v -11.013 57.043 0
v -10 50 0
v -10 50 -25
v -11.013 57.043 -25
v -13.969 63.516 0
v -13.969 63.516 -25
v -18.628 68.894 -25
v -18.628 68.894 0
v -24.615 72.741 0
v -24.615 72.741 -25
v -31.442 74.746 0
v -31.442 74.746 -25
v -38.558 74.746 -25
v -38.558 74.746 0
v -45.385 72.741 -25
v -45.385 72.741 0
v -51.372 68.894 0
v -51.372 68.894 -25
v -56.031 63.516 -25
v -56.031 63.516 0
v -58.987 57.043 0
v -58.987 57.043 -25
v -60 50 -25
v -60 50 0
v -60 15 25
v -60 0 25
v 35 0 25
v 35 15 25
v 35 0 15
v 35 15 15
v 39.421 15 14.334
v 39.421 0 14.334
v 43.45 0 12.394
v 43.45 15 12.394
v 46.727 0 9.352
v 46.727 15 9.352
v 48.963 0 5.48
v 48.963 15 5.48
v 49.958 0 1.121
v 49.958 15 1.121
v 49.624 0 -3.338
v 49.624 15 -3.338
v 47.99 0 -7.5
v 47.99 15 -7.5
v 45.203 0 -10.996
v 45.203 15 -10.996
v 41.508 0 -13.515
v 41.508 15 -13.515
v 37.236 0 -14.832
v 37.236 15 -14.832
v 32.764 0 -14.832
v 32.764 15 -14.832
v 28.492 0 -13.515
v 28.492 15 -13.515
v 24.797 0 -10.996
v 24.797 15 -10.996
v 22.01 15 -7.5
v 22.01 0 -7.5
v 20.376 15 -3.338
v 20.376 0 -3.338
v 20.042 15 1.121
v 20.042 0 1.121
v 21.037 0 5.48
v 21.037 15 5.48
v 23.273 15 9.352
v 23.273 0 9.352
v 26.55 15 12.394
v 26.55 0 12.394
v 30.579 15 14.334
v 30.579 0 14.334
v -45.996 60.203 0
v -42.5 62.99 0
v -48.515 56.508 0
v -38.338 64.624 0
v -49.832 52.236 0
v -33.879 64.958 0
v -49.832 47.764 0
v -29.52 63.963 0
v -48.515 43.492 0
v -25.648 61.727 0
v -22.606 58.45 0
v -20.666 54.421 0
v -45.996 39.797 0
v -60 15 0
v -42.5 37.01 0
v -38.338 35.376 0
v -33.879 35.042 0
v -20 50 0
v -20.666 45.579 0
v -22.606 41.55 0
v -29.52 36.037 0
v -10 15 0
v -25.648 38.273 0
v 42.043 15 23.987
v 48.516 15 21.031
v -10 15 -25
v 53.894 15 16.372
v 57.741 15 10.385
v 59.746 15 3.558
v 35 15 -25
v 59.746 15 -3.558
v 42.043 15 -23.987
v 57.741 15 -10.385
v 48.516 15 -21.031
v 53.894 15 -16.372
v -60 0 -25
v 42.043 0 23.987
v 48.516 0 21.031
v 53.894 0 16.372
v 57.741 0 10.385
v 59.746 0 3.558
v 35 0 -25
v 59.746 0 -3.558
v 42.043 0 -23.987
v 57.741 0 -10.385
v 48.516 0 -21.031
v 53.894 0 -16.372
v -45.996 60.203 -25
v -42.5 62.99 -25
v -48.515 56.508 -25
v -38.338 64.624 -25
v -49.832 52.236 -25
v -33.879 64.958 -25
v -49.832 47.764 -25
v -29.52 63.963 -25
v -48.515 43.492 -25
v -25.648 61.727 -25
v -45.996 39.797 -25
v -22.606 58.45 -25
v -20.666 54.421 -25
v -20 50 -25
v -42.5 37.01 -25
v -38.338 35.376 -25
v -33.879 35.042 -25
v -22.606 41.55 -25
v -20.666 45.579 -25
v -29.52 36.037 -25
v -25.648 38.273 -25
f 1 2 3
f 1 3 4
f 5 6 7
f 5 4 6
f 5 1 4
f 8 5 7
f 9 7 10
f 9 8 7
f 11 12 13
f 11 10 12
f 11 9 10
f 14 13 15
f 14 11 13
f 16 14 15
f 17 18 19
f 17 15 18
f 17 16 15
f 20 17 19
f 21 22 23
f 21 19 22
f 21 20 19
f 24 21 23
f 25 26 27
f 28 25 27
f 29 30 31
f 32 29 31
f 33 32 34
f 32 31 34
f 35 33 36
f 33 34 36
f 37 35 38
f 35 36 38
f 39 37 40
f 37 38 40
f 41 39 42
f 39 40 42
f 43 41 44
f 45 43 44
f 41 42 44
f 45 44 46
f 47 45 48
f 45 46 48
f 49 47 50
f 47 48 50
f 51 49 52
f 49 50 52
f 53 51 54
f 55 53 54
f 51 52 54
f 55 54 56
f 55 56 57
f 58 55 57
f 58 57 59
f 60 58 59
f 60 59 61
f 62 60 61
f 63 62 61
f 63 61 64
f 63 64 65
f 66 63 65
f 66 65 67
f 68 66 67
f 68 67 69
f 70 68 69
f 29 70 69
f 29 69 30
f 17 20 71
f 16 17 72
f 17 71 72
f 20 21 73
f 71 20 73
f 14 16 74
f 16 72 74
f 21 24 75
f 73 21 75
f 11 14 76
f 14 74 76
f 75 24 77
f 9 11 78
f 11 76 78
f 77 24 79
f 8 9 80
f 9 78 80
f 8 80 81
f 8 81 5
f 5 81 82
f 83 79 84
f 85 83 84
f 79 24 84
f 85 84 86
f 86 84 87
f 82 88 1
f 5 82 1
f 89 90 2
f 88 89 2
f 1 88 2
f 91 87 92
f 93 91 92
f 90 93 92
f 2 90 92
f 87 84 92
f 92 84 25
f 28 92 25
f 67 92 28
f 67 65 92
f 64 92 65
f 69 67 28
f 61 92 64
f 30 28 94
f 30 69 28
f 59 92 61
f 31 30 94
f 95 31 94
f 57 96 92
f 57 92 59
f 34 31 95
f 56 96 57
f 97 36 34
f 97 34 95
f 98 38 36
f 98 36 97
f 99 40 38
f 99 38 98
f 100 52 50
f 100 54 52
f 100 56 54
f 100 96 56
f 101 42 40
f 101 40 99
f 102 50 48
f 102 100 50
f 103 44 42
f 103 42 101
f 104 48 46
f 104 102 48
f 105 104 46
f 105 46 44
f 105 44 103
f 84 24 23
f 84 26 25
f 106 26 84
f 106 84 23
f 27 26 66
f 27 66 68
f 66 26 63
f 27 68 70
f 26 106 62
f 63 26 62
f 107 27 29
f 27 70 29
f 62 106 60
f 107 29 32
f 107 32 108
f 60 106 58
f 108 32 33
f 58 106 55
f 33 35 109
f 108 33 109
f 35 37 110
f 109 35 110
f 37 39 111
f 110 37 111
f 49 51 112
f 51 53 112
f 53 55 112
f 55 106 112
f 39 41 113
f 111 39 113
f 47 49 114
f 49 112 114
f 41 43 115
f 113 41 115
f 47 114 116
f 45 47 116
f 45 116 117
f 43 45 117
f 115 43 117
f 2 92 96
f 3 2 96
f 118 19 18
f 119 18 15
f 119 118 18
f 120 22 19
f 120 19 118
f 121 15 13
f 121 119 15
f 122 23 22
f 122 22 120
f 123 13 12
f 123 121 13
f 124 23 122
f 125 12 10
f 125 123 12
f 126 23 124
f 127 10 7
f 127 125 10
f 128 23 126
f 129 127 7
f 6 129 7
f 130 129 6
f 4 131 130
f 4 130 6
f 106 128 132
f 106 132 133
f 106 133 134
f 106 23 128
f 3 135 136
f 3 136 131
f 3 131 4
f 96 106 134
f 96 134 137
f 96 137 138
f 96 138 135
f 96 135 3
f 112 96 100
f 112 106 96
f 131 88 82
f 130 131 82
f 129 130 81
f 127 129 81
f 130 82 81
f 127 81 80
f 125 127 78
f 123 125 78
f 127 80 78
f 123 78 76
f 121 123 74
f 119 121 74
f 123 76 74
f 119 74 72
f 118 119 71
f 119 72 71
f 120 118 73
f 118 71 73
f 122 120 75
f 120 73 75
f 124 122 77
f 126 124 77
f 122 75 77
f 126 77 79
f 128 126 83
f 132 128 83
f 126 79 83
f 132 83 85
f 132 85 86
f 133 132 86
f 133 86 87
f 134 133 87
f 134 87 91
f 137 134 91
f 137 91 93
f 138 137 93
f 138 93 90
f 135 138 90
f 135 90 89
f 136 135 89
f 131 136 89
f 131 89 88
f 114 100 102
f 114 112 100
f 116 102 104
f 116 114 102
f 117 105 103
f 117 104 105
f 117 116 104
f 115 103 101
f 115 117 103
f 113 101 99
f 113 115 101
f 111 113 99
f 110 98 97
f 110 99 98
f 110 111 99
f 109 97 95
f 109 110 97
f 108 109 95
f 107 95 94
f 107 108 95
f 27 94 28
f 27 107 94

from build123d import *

# Parameters (mm, degrees)
CROQUIS1_W              = 120
CROQUIS1_H              = 50
SALIENTE_EXTRUIR1_DEPTH = 15
CROQUIS2_W              = 50
CROQUIS2_H              = 25
SALIENTE_EXTRUIR2_DEPTH = 60
REDONDEO5_RADIUS        = 25
REDONDEO5_LENGTH        = 25
REDONDEO6_RADIUS        = 25
REDONDEO6_LENGTH        = 15
CROQUIS3_R              = 15
CORTAR_EXTRUIR1_DEPTH   = 89.459030065
CROQUIS4_R              = 15
CORTAR_EXTRUIR2_DEPTH   = 100.247166206


with BuildPart() as part:
    # Croquis1 → Saliente-Extruir1 (new body)
    with BuildSketch(Plane(origin=(0, 0, 0), x_dir=(1, 0, 0), z_dir=(0, 1, 0))):
        Rectangle(CROQUIS1_W, CROQUIS1_H)
    extrude(amount=SALIENTE_EXTRUIR1_DEPTH)

    # Croquis2 → Saliente-Extruir2 (add)
    with BuildSketch(Plane(origin=(0, 15, 0), x_dir=(1, 0, 0), z_dir=(0, 1, 0))):
        with Locations((-35, 12.5)):
            Rectangle(CROQUIS2_W, CROQUIS2_H)
    extrude(amount=SALIENTE_EXTRUIR2_DEPTH)

    # Redondeo5: full round fillet: the end face becomes a half cylinder, R = half its width
    redondeo5_face = Plane((-35, 75, -12.5), x_dir=(0, 0, 1), z_dir=(0, 1, 0))  # on the end face: x along it, z out of the body
    redondeo5_slab = redondeo5_face.offset(-REDONDEO5_RADIUS / 2) * Box(REDONDEO5_LENGTH, 2 * REDONDEO5_RADIUS, REDONDEO5_RADIUS, mode=Mode.PRIVATE)  # the body's end, R deep
    redondeo5_round = Plane((-35, 50, -12.5), x_dir=(0, 1, 0), z_dir=(0, 0, 1)) * Cylinder(REDONDEO5_RADIUS, REDONDEO5_LENGTH, mode=Mode.PRIVATE)  # its axis R under the face
    add(redondeo5_slab - redondeo5_round, mode=Mode.SUBTRACT)

    # Redondeo6: full round fillet: the end face becomes a half cylinder, R = half its width
    redondeo6_face = Plane((60, 7.5, 0), x_dir=(0, -1, 0), z_dir=(1, 0, 0))  # on the end face: x along it, z out of the body
    redondeo6_slab = redondeo6_face.offset(-REDONDEO6_RADIUS / 2) * Box(REDONDEO6_LENGTH, 2 * REDONDEO6_RADIUS, REDONDEO6_RADIUS, mode=Mode.PRIVATE)  # the body's end, R deep
    redondeo6_round = Plane((35, 7.5, 0), x_dir=(1, 0, 0), z_dir=(0, -1, 0)) * Cylinder(REDONDEO6_RADIUS, REDONDEO6_LENGTH, mode=Mode.PRIVATE)  # its axis R under the face
    add(redondeo6_slab - redondeo6_round, mode=Mode.SUBTRACT)

    # Croquis3 → Cortar-Extruir1 (cut, through all)
    with BuildSketch(Plane(origin=(0, 15, 0), x_dir=(1, 0, 0), z_dir=(0, 1, 0))):
        with Locations(Location((35, 0, 0), (0, 0, 270))):
            Circle(CROQUIS3_R)
    extrude(amount=-CORTAR_EXTRUIR1_DEPTH, mode=Mode.SUBTRACT)

    # Croquis4 → Cortar-Extruir2 (cut, through all)
    with BuildSketch(Plane.XY):
        with Locations((-35, 50)):
            Circle(CROQUIS4_R)
    extrude(amount=-CORTAR_EXTRUIR2_DEPTH, mode=Mode.SUBTRACT)


solid = part.part
